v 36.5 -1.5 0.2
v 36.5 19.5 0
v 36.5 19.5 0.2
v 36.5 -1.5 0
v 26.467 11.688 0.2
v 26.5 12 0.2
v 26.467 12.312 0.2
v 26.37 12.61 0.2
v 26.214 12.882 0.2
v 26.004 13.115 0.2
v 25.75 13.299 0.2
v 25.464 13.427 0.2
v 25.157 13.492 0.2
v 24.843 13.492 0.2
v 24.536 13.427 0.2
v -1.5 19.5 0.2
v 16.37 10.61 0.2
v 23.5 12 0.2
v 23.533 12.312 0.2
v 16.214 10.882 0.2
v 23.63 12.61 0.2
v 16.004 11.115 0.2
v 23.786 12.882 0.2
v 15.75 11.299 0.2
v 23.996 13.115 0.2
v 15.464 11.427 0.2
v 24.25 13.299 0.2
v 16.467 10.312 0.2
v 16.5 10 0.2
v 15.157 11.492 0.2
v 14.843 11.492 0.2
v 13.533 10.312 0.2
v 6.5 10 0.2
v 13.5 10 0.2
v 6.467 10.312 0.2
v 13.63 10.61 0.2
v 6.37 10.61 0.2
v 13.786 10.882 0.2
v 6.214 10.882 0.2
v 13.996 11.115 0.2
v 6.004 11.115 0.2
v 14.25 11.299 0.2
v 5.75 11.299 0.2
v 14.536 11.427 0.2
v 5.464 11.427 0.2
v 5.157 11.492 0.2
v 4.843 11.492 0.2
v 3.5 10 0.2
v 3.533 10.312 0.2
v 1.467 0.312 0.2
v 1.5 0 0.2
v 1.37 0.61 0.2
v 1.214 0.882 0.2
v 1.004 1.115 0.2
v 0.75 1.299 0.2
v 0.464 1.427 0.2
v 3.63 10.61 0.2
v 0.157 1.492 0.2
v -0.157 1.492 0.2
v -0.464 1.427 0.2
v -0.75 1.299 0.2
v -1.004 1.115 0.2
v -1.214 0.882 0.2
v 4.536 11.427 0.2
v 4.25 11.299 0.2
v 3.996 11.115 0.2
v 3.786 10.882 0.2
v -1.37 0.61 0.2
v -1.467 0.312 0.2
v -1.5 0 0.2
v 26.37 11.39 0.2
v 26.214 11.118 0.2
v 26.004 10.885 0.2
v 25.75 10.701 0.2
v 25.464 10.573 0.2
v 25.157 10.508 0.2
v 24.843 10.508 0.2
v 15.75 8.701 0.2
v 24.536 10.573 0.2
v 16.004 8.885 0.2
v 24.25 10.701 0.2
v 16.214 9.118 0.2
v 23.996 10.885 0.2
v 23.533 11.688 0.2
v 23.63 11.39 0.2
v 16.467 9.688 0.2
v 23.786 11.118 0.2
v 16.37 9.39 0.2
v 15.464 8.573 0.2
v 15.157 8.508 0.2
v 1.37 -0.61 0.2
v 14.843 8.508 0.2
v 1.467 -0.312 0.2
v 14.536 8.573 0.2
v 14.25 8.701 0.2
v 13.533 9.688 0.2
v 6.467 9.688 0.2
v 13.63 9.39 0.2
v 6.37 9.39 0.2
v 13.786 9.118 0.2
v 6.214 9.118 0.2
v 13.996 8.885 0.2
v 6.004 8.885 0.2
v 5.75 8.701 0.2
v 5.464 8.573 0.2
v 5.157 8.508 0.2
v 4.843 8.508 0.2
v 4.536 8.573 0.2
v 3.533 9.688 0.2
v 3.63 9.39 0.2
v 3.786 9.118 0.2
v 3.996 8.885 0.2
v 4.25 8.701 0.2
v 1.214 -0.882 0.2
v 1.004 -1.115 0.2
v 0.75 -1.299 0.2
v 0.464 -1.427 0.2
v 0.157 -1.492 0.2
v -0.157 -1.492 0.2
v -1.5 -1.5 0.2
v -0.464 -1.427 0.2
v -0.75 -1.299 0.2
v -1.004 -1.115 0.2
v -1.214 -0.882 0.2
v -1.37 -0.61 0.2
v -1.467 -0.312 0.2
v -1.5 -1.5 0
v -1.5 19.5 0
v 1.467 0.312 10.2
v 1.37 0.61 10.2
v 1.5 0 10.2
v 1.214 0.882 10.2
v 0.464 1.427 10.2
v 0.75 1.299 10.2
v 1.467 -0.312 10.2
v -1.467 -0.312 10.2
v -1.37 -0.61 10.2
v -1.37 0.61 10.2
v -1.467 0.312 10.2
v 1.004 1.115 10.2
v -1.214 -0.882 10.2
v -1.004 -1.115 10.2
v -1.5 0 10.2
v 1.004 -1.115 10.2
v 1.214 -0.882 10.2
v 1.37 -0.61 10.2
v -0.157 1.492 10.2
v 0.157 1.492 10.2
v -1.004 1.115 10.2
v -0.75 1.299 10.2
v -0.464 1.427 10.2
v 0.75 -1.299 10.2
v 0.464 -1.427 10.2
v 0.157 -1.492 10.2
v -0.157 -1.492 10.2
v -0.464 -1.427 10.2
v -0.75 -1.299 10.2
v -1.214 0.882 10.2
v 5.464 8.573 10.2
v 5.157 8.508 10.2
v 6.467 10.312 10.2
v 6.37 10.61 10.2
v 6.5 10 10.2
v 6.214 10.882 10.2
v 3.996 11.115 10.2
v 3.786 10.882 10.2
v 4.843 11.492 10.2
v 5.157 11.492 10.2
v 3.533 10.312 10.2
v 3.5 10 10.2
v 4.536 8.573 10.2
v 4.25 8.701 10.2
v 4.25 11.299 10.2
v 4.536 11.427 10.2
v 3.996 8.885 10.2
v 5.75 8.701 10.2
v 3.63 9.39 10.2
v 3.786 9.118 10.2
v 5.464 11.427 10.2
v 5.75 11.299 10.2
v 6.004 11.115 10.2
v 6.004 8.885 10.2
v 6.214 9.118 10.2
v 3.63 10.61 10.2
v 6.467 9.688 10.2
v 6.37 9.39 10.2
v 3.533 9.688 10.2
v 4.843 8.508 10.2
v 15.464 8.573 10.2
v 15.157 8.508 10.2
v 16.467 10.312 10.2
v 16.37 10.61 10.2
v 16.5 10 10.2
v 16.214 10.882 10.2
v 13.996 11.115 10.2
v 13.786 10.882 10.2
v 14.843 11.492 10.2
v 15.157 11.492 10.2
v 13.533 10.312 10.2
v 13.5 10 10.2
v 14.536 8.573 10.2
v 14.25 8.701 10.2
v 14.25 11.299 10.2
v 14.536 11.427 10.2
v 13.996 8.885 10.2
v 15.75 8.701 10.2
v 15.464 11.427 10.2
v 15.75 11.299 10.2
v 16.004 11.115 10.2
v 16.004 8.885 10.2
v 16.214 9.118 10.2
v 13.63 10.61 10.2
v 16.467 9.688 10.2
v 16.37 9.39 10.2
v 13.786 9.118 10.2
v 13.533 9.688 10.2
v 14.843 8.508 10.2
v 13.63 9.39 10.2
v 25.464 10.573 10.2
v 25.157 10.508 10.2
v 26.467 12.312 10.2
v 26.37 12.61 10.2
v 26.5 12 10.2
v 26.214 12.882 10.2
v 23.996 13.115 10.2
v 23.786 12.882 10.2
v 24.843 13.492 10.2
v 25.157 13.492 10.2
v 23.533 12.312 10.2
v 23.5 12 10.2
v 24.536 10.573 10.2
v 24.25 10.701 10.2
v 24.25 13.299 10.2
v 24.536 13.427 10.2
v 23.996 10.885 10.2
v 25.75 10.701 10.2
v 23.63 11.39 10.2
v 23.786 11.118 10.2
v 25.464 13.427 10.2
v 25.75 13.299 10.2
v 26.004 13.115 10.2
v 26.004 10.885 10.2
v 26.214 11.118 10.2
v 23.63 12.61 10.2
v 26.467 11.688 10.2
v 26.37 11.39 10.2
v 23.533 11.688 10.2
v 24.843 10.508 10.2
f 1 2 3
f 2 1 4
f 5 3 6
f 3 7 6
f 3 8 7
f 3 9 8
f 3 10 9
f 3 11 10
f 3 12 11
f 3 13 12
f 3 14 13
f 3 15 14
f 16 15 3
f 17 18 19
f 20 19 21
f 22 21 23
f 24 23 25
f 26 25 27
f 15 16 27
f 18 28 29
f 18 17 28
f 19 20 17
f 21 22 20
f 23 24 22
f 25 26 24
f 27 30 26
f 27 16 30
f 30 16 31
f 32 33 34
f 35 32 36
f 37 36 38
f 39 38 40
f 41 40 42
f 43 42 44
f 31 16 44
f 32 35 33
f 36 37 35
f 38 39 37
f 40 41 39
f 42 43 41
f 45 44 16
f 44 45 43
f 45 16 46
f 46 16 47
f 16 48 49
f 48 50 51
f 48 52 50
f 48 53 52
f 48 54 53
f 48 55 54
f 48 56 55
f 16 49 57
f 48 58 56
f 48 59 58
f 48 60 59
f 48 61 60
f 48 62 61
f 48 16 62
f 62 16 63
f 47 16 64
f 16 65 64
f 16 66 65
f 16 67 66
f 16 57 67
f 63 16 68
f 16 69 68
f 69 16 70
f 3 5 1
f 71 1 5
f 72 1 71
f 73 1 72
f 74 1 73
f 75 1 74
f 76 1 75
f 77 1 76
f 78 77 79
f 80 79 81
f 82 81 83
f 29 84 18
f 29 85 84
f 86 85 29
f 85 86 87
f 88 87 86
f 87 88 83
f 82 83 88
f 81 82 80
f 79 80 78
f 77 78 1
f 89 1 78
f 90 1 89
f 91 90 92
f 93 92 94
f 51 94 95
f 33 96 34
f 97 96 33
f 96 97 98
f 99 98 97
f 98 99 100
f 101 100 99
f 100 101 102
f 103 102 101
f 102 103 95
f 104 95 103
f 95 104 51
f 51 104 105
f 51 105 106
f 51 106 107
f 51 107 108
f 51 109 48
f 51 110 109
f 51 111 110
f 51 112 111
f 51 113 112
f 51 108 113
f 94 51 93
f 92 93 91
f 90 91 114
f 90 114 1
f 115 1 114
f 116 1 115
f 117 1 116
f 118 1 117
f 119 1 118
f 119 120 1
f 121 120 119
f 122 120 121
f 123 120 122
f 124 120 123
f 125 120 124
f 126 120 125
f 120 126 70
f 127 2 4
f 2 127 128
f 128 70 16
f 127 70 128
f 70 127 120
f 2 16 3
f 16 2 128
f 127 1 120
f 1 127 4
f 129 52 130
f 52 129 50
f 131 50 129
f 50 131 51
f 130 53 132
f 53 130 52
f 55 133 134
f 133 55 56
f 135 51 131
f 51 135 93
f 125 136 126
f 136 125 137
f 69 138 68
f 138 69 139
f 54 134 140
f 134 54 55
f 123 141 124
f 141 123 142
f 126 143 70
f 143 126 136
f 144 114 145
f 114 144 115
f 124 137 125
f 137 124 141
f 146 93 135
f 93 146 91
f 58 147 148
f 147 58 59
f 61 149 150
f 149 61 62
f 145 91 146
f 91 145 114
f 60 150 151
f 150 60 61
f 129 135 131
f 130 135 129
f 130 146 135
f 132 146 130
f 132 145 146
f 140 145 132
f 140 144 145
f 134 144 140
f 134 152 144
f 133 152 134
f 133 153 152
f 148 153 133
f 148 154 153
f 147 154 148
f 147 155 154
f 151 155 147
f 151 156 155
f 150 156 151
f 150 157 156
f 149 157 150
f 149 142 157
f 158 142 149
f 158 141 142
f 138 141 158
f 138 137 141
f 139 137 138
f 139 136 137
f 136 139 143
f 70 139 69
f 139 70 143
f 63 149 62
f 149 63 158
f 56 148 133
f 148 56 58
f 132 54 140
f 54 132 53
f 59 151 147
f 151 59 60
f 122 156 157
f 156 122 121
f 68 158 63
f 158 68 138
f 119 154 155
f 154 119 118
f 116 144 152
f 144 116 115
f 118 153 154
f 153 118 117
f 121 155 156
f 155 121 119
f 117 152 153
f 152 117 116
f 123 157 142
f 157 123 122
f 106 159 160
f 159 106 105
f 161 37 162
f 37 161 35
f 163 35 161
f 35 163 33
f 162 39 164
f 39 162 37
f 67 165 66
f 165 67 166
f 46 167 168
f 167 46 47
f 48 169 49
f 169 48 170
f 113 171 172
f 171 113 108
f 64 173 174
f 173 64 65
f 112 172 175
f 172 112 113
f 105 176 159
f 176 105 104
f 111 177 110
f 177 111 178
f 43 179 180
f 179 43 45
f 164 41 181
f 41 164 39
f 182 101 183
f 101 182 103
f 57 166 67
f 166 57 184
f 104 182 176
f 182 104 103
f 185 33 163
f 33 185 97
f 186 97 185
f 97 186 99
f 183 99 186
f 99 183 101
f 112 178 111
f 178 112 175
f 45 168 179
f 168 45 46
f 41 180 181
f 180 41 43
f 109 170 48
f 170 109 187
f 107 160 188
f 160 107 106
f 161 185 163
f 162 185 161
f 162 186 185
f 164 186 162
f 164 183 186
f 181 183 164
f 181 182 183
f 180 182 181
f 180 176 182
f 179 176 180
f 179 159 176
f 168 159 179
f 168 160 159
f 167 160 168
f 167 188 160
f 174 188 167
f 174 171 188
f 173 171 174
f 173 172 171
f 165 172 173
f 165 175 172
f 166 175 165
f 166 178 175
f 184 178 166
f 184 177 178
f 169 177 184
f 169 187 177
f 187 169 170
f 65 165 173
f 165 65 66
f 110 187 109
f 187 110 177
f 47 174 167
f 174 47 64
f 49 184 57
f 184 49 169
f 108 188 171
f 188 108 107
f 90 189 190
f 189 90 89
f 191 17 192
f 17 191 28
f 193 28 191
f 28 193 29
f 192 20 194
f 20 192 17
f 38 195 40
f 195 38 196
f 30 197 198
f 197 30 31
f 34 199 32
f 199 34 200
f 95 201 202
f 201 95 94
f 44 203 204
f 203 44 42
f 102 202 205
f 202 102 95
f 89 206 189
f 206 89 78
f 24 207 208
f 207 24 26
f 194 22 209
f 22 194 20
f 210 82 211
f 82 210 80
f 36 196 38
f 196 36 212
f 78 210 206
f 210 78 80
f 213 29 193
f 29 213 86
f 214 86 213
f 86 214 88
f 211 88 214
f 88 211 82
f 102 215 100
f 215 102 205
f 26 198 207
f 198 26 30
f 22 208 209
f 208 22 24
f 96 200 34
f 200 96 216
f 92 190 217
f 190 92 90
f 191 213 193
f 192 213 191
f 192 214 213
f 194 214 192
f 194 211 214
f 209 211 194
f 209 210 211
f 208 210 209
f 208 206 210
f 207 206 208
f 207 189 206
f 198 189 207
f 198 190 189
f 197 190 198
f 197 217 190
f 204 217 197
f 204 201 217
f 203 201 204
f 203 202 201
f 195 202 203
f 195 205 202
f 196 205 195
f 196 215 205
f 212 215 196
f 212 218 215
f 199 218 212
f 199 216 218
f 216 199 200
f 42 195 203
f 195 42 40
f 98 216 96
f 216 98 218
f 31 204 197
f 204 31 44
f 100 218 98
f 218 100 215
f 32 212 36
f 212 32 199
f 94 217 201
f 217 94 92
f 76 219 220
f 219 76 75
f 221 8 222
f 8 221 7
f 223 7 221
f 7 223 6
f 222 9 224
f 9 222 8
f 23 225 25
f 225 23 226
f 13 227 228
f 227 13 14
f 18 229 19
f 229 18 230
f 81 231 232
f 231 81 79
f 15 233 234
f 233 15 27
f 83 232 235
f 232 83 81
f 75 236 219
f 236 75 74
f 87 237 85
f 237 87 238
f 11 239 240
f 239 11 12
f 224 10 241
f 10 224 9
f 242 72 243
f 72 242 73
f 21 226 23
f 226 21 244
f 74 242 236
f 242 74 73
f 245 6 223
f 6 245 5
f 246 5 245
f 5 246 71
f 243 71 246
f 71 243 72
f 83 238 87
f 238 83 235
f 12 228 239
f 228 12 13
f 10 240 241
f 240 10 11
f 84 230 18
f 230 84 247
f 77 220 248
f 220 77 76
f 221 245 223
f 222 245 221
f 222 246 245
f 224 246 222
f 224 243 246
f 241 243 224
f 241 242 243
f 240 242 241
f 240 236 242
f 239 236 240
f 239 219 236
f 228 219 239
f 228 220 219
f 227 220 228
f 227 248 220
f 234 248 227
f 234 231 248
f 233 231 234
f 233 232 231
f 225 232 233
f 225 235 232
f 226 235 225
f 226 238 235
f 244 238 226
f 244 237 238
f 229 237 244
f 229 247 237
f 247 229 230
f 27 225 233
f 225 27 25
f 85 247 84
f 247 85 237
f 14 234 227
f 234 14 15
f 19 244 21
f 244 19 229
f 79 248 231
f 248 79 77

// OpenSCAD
$fn=30;

bottom_h = 0.2;

pillar_d = 3;

module part1() {
    translate([-1.5,-1.5,0]) cube([38,21,bottom_h]);
    translate([0,0,bottom_h]) cylinder(d=pillar_d, h=10);
    translate([5,10,bottom_h]) cylinder(d=pillar_d, h=10);
    translate([15,10,bottom_h]) cylinder(d=pillar_d, h=10);
    translate([25,12,bottom_h]) cylinder(d=pillar_d, h=10);
}

module part2() {
    translate([5,18,bottom_h]) cylinder(d=pillar_d, h=10);
    translate([35,10,bottom_h]) cylinder(d=pillar_d, h=10);
    translate([25,0,bottom_h]) cylinder(d=pillar_d, h=10);
    translate([15,1,bottom_h]) cylinder(d=pillar_d, h=10);
}

module retractor() {
    union() {
        part1();
        part2();
    }
}

//retractor();
part1();
//part2();
